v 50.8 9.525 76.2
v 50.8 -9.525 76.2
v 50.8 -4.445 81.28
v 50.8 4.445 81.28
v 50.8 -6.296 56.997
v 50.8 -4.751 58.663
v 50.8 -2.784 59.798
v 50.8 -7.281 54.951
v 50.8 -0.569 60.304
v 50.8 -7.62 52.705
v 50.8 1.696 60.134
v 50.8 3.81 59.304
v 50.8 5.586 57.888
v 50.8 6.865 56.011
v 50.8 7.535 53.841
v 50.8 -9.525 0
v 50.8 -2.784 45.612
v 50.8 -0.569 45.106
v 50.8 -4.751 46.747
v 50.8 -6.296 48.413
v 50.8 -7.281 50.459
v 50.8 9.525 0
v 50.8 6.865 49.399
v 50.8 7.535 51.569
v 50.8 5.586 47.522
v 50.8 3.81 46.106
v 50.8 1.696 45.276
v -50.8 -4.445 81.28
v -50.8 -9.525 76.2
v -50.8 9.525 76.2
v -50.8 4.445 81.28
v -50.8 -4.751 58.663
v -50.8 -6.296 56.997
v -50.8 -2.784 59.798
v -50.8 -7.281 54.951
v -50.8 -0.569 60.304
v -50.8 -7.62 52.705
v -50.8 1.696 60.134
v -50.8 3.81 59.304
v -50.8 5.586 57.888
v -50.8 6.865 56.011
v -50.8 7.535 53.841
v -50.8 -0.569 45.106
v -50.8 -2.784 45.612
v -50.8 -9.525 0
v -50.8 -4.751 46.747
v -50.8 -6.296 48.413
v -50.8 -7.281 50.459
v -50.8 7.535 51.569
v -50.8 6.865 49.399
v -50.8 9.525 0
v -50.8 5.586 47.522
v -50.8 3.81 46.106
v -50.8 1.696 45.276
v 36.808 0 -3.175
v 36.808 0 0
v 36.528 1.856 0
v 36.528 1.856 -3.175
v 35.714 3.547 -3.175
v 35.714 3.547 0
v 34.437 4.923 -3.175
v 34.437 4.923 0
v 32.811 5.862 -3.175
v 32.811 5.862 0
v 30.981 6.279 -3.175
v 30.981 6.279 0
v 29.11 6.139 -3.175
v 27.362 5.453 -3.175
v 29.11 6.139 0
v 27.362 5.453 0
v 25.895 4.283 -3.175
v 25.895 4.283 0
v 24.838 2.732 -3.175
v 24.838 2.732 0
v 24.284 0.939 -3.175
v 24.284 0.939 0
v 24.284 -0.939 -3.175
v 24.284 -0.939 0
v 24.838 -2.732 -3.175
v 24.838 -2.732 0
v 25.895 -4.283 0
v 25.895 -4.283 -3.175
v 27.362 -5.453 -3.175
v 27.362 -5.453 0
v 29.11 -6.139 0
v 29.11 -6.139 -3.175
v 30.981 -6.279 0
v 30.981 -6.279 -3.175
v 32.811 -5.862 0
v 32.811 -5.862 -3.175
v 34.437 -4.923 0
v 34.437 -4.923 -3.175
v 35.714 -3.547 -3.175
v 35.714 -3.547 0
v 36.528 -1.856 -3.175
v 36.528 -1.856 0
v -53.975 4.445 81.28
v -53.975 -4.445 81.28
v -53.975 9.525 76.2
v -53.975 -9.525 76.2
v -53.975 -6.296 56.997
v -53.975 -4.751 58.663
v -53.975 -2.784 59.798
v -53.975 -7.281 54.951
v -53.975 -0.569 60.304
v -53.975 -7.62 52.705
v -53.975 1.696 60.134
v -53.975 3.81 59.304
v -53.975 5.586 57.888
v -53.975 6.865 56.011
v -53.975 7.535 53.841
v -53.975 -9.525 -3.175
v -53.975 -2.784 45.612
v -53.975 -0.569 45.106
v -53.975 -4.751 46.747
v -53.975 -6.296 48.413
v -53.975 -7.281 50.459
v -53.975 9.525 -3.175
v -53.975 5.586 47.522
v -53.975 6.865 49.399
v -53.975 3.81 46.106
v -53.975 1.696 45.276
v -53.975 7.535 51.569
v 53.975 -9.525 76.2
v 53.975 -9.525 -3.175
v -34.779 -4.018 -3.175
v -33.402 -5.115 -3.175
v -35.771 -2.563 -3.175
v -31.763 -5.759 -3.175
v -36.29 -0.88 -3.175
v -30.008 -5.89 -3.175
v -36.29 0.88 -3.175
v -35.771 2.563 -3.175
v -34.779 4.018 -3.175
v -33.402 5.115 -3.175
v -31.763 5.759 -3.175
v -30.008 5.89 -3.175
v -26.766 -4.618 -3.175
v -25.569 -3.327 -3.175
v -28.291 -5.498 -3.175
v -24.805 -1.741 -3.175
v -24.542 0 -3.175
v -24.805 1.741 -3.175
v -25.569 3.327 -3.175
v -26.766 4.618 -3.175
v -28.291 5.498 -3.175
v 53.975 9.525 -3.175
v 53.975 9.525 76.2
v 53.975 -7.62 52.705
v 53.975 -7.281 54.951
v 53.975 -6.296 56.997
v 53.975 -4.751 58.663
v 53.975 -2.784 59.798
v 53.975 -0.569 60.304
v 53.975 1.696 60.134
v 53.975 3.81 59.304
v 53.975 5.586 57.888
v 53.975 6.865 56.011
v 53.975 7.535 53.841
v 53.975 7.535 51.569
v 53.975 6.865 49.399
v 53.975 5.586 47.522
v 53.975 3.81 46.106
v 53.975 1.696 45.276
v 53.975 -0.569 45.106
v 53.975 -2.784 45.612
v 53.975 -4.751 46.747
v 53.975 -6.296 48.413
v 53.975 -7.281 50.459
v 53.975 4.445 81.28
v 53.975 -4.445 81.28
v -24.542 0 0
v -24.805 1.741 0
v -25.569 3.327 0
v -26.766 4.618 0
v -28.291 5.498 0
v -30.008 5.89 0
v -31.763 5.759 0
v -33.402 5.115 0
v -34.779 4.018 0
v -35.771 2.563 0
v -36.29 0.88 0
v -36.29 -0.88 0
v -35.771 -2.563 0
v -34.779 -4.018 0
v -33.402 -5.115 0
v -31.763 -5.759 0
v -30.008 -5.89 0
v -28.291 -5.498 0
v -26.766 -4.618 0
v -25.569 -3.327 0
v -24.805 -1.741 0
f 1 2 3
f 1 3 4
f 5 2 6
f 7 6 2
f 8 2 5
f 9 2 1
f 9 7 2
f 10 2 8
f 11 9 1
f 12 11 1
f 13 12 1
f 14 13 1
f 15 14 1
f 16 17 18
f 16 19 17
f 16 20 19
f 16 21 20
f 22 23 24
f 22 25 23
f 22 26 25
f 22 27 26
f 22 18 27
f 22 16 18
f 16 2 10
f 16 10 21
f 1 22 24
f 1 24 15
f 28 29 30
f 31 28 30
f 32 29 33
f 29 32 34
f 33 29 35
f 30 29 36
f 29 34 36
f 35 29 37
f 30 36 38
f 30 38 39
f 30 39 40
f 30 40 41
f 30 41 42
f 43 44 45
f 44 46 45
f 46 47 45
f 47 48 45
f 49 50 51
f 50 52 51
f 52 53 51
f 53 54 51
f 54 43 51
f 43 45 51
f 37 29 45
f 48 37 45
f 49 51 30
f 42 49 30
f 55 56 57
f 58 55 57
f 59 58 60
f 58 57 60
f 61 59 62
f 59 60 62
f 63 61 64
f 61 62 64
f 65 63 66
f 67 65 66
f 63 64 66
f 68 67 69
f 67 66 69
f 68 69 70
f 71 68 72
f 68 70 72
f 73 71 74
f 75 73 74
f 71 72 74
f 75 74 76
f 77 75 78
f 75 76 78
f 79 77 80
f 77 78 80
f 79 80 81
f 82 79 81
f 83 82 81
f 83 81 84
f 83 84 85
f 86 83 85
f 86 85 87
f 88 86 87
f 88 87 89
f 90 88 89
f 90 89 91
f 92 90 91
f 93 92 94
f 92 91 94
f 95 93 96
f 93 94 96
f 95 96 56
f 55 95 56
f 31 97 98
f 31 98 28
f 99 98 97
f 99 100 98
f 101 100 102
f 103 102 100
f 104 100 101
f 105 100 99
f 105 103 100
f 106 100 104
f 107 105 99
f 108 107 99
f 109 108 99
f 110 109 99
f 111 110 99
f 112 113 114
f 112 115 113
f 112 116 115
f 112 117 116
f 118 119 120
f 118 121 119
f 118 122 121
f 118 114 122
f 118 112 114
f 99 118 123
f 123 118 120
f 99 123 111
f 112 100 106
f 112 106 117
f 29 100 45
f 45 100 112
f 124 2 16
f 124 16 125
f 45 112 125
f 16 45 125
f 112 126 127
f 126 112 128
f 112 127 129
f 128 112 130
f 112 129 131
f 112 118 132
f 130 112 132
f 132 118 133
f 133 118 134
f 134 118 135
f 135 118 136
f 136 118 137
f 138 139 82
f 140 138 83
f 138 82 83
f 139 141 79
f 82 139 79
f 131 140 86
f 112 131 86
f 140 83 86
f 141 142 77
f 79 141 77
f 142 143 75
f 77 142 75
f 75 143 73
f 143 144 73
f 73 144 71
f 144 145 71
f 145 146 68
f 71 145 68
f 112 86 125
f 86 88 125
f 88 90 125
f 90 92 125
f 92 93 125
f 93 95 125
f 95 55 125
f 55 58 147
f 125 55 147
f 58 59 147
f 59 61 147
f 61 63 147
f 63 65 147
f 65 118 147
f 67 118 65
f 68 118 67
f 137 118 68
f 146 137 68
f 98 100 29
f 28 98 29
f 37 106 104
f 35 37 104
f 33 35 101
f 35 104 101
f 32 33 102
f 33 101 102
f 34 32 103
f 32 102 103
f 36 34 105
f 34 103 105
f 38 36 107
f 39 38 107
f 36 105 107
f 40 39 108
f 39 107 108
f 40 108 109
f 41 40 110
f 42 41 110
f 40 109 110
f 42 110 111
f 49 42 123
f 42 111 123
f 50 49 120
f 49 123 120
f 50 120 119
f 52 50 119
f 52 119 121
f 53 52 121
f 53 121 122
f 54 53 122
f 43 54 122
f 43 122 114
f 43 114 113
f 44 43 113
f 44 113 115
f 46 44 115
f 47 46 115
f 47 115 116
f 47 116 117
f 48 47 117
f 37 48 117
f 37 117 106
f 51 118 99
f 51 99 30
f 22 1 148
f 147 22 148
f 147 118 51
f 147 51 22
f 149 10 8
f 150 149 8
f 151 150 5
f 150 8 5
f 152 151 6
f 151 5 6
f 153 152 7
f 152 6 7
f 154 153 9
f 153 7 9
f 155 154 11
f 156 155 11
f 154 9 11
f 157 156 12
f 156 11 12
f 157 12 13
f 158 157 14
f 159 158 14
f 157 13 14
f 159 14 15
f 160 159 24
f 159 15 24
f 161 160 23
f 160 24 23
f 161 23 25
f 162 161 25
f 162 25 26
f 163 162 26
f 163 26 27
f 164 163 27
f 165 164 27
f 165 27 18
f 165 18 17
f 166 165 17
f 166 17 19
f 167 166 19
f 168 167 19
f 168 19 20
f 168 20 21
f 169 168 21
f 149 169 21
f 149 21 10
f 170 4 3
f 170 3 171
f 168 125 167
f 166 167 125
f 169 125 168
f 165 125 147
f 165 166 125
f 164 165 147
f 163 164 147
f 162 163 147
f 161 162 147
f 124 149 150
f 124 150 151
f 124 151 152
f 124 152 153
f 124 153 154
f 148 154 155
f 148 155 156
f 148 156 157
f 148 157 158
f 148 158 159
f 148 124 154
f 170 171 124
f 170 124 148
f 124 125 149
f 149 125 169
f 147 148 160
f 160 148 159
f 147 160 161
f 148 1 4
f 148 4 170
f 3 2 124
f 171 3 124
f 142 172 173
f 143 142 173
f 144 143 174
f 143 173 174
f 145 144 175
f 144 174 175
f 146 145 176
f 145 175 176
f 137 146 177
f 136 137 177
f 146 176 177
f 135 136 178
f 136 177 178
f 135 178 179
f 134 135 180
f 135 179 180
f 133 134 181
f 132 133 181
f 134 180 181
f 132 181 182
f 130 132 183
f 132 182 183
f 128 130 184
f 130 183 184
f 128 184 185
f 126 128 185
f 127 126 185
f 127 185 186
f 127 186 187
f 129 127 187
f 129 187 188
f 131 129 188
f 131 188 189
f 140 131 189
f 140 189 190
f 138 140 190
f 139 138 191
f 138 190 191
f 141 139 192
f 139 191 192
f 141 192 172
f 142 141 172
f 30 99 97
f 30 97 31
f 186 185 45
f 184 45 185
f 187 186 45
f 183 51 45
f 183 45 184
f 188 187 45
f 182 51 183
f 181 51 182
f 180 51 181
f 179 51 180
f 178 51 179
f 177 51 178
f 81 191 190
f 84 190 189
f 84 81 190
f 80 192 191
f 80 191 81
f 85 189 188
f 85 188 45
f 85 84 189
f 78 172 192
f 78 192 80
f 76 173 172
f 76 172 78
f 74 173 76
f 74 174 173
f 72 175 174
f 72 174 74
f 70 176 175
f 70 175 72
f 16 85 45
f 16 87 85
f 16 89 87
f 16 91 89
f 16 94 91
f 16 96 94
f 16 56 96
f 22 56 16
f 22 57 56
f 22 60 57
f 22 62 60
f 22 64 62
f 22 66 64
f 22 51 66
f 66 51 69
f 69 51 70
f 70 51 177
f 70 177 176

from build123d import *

# Parameters (mm, degrees)
F0_W     = 107.95
F0_H     = 19.05
F1_DEPTH = 3.175
F2_W     = 3.175
F2_H     = 19.05
F3_DEPTH = 81.28
F4_SIZE  = 5.08
F5_R     = 7.62
F6_DEPTH = 107.95
F7_R     = 5.906651
F7_R_2   = 6.296928
F8_DEPTH = 3.175


with BuildPart() as f1:
    # F0 (on Top) → F1 (new body)
    with BuildSketch(Plane.XY):
        Rectangle(F0_W, F0_H)
    extrude(amount=-F1_DEPTH)

    # F2 (on Top) → F3 (join)
    with BuildSketch(Plane.XY):
        with Locations((-52.3875, 0)):
            Rectangle(F2_W, F2_H)
        with Locations((52.3875, 0)):
            Rectangle(F2_W, F2_H)
    extrude(amount=F3_DEPTH)

    # F4
    f4_edges = [f1.edges().sort_by_distance(p)[0] for p in [
        (52.3875, -9.525, 81.28),
        (52.3875, 9.525, 81.28),
        (-52.3875, -9.525, 81.28),
        (-52.3875, 9.525, 81.28),
    ]]
    chamfer(f4_edges, length=F4_SIZE)

    # F5 (on face) → F6 (cut, through all)
    with BuildSketch(Plane(origin=(-53.975, 0, 0), x_dir=(0, -1, 0), z_dir=(-1, 0, 0))):
        with Locations((0, 52.705)):
            Circle(F5_R)
    extrude(amount=-F6_DEPTH, mode=Mode.SUBTRACT)

    # F7 (on face) → F8 (cut, through all)
    with BuildSketch(Plane.XY):
        with Locations((-30.449122, 0)):
            Circle(F7_R)
        with Locations((30.510878, 0)):
            Circle(F7_R_2)
    extrude(amount=-F8_DEPTH, mode=Mode.SUBTRACT)


solid = f1.part
